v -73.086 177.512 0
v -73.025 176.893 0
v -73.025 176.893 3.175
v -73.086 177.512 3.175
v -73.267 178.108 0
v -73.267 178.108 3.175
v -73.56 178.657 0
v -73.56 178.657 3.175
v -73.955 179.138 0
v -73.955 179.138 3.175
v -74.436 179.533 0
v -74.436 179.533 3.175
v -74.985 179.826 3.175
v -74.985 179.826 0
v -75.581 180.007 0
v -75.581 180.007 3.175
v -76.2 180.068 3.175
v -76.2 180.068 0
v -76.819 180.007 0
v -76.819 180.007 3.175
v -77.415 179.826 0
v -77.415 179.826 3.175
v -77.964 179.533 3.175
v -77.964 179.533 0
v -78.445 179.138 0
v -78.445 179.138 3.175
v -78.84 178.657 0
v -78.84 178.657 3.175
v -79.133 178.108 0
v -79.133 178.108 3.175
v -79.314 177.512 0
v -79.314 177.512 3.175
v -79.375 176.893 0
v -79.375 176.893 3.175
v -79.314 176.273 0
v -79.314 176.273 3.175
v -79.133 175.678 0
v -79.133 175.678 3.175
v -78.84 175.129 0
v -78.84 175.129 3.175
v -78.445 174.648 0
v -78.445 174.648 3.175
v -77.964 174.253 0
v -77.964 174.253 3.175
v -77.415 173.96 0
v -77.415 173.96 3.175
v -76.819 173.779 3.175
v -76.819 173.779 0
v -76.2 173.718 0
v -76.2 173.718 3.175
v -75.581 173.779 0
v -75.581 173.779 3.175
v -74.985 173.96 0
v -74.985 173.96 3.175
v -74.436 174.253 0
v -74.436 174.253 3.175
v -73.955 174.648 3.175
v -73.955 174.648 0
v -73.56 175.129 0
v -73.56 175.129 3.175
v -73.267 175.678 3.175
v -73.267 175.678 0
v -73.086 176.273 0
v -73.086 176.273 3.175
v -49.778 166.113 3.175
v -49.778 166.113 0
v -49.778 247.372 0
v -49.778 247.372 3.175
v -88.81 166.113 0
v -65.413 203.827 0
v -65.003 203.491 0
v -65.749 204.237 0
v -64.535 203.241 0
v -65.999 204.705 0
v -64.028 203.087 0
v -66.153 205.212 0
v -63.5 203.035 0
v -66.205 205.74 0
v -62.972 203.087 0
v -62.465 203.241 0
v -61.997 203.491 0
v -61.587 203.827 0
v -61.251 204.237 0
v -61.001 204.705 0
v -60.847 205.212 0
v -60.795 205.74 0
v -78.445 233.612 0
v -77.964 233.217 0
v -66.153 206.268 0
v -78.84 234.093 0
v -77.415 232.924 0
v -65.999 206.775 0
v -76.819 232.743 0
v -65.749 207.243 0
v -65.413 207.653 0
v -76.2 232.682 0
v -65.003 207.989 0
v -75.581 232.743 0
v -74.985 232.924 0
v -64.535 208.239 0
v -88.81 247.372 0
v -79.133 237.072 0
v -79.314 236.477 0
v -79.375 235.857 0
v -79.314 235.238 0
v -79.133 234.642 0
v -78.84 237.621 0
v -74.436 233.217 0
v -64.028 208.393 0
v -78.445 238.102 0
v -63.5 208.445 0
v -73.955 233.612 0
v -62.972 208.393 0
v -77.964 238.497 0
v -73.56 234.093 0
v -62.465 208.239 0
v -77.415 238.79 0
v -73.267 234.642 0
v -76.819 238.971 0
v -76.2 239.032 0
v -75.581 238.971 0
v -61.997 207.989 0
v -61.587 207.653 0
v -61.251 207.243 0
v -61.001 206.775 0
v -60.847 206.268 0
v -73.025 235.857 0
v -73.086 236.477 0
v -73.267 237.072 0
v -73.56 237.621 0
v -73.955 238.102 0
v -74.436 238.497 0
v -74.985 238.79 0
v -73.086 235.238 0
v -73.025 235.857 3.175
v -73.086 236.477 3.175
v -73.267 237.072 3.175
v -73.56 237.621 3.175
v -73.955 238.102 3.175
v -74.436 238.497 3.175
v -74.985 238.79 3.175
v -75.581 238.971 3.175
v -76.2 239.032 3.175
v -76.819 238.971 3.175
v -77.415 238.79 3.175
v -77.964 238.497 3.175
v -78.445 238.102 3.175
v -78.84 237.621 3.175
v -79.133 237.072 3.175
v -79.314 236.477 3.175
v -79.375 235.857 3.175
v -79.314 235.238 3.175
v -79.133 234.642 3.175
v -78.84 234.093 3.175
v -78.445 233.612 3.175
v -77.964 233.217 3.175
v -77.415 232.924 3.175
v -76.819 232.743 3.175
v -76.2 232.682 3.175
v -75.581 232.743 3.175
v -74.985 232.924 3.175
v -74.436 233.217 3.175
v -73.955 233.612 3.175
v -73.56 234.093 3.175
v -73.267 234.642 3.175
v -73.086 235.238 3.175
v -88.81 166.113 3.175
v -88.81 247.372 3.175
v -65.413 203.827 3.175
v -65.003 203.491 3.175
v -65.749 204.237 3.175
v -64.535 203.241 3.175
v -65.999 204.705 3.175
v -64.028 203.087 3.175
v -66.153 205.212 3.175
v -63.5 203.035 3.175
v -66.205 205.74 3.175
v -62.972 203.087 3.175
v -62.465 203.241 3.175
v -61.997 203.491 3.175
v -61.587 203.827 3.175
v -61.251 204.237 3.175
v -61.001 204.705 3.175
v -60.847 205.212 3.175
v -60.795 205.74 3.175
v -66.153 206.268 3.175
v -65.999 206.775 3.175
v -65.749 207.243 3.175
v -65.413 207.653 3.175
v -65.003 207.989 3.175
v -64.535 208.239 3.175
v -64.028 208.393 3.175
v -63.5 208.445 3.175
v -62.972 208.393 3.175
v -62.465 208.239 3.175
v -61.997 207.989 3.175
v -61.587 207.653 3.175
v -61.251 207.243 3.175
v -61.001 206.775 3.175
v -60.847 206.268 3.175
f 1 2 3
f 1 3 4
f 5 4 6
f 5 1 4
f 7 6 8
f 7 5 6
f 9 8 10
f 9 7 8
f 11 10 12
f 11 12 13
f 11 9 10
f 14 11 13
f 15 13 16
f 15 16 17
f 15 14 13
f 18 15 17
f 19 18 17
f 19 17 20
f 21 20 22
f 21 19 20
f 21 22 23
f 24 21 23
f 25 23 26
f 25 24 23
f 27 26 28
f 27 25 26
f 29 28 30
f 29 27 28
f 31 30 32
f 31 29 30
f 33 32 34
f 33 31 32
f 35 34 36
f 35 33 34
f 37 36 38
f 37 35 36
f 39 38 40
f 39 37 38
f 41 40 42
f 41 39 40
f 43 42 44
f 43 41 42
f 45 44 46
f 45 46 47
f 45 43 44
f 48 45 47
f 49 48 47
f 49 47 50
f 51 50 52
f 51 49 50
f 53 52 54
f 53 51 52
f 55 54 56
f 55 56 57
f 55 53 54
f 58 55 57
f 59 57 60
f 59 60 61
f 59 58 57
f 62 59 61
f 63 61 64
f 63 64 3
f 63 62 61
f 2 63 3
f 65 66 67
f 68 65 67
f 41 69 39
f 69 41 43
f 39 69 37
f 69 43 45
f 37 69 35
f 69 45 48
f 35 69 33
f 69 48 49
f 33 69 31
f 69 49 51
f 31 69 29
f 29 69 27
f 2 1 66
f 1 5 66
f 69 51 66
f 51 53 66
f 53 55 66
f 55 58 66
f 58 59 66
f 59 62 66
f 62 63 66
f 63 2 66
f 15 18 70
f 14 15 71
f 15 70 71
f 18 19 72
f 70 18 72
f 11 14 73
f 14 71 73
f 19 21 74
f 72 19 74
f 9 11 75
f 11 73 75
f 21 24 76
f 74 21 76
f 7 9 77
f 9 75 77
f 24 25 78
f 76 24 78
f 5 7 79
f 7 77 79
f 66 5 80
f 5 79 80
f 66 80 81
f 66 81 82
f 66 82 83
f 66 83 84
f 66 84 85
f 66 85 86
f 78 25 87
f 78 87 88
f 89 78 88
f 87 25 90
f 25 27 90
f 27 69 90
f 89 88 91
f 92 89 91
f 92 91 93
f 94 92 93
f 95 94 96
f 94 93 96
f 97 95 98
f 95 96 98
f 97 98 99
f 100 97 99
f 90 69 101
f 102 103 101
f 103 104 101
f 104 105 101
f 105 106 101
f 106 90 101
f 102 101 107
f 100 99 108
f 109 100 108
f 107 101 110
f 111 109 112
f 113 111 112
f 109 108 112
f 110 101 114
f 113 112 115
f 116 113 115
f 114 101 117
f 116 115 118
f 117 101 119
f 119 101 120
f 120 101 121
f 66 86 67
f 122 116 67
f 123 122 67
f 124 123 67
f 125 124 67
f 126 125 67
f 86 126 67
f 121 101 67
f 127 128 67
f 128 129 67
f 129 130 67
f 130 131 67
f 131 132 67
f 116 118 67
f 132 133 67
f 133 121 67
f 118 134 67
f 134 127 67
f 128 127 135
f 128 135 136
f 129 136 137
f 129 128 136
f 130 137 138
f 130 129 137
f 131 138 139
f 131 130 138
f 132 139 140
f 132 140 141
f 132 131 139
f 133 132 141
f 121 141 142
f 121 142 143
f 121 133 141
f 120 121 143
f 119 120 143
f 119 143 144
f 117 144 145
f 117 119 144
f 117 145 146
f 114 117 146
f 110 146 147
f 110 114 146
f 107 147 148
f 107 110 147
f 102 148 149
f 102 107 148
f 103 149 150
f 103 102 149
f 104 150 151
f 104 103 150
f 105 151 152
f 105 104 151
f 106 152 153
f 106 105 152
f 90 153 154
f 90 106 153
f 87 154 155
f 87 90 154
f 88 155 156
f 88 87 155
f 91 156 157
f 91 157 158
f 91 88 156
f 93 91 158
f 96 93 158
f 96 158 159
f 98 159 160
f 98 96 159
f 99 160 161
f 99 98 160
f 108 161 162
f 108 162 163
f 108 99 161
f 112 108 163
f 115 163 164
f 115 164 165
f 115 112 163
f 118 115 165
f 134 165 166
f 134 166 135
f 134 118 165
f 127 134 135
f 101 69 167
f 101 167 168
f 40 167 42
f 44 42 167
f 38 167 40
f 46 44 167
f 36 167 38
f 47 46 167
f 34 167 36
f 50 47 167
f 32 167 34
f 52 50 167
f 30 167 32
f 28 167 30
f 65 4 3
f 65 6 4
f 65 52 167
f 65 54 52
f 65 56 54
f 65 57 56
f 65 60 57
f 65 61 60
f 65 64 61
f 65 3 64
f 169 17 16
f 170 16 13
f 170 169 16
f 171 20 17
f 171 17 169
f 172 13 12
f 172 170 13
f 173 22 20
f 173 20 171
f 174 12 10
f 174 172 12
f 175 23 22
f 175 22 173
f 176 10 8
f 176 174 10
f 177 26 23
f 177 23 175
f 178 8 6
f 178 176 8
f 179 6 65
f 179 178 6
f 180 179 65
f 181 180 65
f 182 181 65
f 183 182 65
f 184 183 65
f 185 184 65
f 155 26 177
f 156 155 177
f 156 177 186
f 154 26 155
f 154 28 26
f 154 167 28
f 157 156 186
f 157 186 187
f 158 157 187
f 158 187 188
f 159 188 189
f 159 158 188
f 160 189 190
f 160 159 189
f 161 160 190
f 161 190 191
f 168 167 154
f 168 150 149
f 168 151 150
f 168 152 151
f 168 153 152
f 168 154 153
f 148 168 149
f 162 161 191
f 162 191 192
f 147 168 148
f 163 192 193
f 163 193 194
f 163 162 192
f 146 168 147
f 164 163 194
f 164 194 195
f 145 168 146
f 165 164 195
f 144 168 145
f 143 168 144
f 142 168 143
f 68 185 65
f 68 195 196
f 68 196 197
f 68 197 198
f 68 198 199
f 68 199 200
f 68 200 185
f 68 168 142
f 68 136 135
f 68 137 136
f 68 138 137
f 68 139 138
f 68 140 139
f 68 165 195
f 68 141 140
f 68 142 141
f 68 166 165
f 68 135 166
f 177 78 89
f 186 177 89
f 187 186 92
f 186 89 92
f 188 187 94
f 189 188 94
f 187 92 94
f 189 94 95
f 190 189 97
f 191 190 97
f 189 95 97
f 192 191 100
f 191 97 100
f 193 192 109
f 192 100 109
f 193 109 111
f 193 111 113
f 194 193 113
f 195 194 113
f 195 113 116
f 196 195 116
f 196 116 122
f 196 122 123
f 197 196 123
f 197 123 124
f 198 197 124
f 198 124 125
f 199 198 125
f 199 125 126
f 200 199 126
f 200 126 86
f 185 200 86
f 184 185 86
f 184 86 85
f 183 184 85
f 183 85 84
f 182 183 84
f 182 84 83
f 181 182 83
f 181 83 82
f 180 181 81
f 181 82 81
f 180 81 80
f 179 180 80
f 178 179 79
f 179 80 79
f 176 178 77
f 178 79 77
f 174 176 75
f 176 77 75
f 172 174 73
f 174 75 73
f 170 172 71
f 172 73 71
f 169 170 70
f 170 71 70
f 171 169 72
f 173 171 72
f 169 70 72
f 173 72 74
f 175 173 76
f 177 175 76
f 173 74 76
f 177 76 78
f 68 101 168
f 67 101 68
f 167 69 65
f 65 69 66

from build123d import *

# Parameters (mm, degrees)
SKETCH1_W               = 39.032335112
SKETCH1_H               = 81.259338173
SKETCH1_R               = 3.175
BOSS_EXTRUDE1_DEPTH     = 3.175
F_1_4_28_TAPPED_HOLE1_D = 5.4102


with BuildPart() as part:
    # Sketch1 → Boss-Extrude1 (new body)
    with BuildSketch(Plane.XY):
        with Locations((-69.293997496, 206.742821462)):
            Rectangle(SKETCH1_W, SKETCH1_H)
        with Locations((-76.2, 235.857142857)):
            Circle(SKETCH1_R, mode=Mode.SUBTRACT)
        with Locations((-76.2, 176.892857143)):
            Circle(SKETCH1_R, mode=Mode.SUBTRACT)
    extrude(amount=BOSS_EXTRUDE1_DEPTH)

    # 1/4-28 Tapped Hole1 (through all)
    with Locations(Plane.XY.offset(3.175)):
        with Locations((-63.5, 205.74)):
            Hole(F_1_4_28_TAPPED_HOLE1_D / 2)


solid = part.part
